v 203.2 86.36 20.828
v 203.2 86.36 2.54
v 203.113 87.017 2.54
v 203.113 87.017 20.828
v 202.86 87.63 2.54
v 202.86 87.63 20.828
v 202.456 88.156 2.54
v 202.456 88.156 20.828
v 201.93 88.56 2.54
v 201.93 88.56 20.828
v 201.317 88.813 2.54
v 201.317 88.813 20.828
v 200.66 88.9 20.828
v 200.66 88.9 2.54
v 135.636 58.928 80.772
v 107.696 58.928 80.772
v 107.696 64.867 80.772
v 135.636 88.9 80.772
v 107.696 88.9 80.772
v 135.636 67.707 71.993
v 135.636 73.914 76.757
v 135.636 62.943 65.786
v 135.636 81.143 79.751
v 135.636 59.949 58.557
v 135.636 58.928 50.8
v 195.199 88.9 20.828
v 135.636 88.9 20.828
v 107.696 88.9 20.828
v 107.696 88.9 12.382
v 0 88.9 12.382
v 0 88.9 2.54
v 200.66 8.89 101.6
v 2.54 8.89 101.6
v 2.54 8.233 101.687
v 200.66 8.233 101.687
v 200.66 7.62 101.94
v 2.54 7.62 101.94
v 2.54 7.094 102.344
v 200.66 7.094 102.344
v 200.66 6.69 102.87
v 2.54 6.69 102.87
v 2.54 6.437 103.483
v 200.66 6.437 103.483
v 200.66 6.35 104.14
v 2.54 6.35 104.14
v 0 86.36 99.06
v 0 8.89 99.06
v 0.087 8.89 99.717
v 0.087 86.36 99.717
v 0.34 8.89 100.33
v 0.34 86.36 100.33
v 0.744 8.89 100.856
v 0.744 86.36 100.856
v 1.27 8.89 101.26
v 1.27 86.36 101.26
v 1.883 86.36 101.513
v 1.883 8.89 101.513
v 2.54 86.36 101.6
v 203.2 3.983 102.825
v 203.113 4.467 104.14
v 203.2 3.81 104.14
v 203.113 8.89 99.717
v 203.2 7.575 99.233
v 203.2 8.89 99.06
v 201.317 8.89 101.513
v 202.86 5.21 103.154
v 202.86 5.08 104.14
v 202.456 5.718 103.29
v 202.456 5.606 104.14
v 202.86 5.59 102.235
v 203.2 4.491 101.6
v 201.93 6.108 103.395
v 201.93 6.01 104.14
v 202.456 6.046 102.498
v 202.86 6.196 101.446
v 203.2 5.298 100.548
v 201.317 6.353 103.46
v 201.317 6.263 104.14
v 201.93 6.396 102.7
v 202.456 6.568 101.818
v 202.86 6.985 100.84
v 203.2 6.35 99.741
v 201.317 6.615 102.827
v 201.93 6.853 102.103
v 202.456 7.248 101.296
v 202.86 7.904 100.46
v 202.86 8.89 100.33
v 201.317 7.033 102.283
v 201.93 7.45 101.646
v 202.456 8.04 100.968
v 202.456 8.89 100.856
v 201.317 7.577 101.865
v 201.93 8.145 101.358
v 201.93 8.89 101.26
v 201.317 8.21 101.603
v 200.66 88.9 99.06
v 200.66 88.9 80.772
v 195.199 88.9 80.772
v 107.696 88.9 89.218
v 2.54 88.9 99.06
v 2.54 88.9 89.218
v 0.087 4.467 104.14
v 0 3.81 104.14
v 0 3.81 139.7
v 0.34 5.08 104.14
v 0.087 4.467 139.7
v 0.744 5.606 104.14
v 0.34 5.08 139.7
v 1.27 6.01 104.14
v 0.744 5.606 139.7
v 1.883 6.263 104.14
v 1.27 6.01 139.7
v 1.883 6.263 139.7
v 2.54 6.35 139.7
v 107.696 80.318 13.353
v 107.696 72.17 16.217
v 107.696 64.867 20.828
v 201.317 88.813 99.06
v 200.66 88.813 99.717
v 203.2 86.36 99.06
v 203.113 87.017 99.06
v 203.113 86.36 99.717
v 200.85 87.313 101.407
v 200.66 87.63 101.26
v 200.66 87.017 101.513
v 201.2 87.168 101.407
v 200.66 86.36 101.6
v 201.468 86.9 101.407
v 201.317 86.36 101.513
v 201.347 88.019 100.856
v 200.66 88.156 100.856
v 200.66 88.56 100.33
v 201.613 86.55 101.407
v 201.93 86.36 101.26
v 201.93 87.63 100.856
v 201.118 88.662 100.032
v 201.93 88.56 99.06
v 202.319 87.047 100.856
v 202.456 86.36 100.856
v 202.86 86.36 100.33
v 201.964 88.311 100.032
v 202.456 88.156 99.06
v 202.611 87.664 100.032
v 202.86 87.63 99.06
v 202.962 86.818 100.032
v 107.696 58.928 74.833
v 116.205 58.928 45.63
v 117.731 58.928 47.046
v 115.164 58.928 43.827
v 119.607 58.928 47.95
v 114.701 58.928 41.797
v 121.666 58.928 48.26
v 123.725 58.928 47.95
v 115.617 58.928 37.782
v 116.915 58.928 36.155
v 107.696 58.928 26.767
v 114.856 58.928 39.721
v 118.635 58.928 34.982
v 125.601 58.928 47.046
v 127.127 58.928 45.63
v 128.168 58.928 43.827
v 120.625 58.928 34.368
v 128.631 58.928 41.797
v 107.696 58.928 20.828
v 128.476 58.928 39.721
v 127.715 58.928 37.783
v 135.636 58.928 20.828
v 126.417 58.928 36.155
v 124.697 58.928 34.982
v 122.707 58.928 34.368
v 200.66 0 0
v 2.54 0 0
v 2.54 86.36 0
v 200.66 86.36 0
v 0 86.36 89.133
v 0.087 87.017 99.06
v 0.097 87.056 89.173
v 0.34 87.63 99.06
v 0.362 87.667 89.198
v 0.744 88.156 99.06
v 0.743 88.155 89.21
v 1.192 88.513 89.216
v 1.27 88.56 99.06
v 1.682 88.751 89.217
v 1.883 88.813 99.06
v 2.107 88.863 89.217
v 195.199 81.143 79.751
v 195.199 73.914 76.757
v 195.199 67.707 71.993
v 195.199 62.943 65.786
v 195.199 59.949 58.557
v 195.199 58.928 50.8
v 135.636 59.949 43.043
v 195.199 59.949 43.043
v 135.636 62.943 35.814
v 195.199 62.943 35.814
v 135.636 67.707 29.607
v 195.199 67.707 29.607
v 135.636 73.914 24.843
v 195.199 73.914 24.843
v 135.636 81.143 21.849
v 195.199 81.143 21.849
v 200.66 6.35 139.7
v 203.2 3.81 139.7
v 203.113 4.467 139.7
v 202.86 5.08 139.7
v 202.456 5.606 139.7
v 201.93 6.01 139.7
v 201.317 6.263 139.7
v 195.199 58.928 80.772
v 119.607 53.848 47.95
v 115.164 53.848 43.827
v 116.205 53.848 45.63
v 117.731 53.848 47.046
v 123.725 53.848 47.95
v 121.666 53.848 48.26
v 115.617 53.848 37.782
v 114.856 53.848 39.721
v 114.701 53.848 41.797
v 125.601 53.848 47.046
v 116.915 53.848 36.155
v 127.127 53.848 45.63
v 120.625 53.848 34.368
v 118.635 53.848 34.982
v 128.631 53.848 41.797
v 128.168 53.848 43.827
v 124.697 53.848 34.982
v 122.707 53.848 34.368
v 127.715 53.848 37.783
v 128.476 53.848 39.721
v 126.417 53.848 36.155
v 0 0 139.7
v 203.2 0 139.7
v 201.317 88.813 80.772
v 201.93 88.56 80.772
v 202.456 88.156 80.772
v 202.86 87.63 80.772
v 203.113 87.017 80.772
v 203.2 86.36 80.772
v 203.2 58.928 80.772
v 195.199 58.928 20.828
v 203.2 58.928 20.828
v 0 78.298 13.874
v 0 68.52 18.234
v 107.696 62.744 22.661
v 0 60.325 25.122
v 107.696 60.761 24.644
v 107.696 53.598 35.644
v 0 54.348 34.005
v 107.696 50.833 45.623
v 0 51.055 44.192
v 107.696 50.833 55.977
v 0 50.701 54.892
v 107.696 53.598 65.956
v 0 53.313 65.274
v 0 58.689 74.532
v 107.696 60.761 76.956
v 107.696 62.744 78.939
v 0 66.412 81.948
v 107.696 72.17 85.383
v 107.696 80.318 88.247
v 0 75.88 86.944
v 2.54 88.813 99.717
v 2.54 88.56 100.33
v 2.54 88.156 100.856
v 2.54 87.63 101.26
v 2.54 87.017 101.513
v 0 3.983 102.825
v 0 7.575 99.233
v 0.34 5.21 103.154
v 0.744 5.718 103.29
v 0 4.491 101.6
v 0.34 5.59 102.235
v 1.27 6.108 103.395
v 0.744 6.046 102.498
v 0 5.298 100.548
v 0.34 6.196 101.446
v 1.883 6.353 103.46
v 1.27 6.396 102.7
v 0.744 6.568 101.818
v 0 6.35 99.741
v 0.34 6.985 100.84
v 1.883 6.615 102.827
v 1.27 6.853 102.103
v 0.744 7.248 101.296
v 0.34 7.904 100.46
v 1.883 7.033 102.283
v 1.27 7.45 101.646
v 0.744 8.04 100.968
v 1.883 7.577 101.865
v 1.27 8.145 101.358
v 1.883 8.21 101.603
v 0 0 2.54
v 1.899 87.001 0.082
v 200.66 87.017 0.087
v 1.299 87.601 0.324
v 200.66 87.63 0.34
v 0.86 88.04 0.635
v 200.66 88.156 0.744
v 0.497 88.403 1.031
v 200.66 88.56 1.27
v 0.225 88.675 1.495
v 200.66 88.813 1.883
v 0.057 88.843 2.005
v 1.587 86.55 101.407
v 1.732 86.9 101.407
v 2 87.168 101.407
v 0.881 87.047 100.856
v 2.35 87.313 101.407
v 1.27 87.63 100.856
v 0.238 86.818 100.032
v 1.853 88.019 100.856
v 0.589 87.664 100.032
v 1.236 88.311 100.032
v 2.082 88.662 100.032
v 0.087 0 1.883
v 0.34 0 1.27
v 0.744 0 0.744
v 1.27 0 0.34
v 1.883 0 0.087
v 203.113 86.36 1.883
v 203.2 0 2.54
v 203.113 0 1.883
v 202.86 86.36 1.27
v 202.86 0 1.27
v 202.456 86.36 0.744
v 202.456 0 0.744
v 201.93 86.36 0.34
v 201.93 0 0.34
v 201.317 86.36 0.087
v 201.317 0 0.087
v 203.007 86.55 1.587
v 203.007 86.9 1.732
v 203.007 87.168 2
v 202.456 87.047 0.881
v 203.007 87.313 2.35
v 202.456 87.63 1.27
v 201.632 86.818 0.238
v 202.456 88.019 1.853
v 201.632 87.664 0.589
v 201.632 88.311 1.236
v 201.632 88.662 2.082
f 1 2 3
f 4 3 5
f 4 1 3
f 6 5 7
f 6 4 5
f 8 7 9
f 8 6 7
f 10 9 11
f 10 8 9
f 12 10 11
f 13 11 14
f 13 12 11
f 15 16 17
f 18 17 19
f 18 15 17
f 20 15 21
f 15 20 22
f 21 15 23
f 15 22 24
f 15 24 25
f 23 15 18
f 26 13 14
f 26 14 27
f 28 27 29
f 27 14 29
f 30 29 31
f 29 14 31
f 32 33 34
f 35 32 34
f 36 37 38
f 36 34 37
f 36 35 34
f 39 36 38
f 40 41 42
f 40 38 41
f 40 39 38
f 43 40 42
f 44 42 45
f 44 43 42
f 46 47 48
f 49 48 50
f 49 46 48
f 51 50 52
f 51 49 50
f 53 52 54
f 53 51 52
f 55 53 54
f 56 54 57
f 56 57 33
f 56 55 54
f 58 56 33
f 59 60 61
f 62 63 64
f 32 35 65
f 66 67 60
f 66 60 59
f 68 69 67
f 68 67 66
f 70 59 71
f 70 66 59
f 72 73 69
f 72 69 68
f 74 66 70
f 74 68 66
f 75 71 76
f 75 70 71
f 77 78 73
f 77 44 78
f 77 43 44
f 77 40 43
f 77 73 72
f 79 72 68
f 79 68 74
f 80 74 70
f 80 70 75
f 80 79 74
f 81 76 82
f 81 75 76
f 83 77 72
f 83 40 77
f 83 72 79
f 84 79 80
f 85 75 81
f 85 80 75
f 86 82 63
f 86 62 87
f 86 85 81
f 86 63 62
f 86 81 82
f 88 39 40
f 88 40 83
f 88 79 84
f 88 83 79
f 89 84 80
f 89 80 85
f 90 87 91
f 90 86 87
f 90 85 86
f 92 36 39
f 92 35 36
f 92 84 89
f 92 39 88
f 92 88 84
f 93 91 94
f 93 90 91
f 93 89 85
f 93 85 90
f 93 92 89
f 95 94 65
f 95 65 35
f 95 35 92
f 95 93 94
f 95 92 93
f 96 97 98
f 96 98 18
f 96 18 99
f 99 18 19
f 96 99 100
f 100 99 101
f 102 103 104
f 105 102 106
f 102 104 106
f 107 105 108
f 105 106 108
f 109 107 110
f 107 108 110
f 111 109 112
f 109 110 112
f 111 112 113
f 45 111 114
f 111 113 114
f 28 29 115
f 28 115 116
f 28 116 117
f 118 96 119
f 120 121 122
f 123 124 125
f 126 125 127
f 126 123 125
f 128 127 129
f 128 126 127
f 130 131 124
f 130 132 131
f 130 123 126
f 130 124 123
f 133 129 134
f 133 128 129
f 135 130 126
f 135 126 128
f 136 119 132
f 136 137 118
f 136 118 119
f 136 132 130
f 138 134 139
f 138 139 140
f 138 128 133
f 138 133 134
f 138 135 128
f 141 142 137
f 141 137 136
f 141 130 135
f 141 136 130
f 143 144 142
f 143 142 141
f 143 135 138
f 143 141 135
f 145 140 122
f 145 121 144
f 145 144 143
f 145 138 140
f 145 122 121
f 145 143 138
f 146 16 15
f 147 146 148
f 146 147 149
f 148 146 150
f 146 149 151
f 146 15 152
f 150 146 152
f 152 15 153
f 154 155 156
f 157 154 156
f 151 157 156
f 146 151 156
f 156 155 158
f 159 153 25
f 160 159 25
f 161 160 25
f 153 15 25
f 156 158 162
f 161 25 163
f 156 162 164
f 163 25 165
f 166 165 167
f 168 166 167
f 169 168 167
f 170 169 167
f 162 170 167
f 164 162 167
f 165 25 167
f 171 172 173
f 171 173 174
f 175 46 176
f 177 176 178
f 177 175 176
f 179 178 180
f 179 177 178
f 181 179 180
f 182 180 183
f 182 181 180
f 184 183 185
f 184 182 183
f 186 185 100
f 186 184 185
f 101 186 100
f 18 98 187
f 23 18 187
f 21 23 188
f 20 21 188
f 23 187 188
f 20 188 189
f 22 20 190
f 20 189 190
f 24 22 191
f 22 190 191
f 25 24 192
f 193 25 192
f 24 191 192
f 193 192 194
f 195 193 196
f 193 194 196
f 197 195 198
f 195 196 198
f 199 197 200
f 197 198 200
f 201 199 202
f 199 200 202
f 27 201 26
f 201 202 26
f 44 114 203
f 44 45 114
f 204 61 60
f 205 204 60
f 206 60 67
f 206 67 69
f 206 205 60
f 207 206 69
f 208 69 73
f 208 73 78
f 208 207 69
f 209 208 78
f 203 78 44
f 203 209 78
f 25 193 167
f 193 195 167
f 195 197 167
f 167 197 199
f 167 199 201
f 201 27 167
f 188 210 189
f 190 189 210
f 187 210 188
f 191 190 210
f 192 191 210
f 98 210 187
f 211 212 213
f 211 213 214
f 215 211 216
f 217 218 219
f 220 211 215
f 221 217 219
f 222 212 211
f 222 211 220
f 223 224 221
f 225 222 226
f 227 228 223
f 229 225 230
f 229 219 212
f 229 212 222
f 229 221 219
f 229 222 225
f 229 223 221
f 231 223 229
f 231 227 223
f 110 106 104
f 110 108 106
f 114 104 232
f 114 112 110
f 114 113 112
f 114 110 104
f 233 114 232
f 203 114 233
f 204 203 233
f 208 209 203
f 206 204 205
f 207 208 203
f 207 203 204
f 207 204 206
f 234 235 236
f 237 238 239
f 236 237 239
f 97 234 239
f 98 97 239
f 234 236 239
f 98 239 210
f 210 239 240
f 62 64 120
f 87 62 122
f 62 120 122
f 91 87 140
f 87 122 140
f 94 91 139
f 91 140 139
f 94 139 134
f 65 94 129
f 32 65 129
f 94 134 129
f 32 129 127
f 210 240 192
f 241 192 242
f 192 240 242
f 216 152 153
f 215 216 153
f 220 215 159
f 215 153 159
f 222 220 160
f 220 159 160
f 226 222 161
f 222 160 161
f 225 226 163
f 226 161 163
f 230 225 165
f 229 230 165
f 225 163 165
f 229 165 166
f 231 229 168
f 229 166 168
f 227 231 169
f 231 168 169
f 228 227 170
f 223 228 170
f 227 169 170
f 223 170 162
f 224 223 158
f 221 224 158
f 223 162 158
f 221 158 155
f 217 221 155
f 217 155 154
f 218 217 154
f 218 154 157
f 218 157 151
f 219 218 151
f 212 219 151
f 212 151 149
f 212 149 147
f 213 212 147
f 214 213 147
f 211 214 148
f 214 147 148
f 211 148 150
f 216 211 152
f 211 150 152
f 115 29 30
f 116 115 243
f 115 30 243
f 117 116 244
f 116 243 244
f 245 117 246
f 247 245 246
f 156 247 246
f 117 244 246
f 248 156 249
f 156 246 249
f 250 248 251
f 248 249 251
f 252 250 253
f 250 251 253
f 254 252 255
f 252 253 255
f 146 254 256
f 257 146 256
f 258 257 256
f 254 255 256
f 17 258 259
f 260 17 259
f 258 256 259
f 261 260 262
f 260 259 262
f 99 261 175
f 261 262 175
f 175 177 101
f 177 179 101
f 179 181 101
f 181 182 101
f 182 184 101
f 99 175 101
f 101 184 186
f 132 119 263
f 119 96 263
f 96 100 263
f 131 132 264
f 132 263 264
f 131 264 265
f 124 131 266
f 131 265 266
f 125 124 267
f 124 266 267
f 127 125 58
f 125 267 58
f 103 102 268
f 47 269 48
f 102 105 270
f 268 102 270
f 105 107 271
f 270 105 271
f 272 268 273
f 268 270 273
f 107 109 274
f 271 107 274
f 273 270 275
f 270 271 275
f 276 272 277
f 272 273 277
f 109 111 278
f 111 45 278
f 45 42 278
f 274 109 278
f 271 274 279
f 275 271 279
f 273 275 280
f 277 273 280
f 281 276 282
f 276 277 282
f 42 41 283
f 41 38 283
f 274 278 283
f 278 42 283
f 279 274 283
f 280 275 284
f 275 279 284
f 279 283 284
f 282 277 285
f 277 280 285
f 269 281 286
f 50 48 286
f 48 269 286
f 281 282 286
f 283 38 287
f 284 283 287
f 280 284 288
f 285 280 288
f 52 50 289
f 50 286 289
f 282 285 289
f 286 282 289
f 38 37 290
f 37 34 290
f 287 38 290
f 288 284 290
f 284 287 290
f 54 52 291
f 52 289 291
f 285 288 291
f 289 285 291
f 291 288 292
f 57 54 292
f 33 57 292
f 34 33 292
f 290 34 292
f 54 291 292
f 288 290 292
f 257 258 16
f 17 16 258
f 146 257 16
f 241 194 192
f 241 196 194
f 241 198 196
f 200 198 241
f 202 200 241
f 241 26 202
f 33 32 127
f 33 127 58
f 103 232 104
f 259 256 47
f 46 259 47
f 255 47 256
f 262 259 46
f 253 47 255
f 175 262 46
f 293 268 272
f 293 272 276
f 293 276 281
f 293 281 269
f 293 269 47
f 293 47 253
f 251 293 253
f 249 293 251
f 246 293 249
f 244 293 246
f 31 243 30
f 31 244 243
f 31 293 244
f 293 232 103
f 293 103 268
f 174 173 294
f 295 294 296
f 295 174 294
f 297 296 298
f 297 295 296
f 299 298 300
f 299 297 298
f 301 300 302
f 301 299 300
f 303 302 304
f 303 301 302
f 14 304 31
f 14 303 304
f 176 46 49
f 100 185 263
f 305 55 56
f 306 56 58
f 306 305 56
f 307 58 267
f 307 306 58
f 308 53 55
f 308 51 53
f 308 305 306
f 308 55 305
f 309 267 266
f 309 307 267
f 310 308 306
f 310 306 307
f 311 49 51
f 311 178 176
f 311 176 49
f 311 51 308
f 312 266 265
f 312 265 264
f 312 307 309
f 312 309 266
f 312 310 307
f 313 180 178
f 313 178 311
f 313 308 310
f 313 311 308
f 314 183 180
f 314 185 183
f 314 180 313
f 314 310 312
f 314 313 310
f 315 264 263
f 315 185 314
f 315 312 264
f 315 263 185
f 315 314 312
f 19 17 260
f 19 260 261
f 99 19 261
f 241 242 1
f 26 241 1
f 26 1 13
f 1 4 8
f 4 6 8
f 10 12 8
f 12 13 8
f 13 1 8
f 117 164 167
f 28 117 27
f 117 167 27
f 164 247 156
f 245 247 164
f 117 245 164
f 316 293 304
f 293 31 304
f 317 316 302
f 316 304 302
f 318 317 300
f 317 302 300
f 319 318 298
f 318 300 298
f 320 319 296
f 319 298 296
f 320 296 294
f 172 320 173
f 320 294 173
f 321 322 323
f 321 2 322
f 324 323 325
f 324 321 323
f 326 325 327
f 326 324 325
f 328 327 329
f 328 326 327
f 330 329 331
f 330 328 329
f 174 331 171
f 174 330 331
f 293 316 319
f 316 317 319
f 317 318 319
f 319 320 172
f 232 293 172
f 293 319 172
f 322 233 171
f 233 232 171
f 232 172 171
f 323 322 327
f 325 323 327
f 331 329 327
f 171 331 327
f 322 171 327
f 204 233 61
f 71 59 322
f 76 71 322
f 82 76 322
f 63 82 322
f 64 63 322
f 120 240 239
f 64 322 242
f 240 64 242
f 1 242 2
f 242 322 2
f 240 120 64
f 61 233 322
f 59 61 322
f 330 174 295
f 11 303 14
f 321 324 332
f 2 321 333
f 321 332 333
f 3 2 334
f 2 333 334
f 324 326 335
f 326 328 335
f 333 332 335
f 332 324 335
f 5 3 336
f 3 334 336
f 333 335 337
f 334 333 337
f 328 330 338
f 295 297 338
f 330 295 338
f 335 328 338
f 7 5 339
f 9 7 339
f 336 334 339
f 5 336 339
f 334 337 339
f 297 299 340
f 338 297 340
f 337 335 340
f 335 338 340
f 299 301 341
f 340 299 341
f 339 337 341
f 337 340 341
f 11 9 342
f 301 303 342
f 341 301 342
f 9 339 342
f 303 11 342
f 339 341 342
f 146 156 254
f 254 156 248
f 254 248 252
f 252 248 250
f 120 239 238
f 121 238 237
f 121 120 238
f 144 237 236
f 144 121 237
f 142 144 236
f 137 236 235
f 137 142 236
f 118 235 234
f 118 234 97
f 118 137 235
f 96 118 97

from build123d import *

# Parameters (mm, degrees)
BOSS_EXTRUDE1_DEPTH = 88.89999999999999
SKETCH2_R           = 29.97200000000001
CUT_EXTRUDE1_DEPTH  = 203.2
CUT_EXTRUDE2_DEPTH  = 8.001
SKETCH4_W           = 59.943999999999946
SKETCH4_H           = 29.972
CUT_EXTRUDE3_DEPTH  = 27.94
SKETCH5_R           = 38.417500000000004
CUT_EXTRUDE4_DEPTH  = 107.696
CUT_EXTRUDE5_DEPTH  = 5.08
SKETCH7_W           = 203.19999999999996
SKETCH7_H           = 6.349999999999999
BOSS_EXTRUDE2_DEPTH = 38.1
FILLET1_R           = 2.54


with BuildPart() as part:
    # Sketch1 → Boss-Extrude1 (new body)
    with BuildSketch(Plane(origin=(0, 0, 0), x_dir=(1, 0, 0), z_dir=(0, 1, 0))):
        Polygon((0, 0), (203.2, 0), (203.2, -101.6), (1.244e-14, -101.6), align=None)
    extrude(amount=BOSS_EXTRUDE1_DEPTH)

    # Sketch2 → Cut-Extrude1 (cut)
    with BuildSketch(Plane(origin=(203.2, 0, 0), x_dir=(-2.2e-16, 0, -1), z_dir=(1, 0, -2.2e-16))):
        with Locations((-50.8, 88.89999999999999)):
            Circle(SKETCH2_R)
    extrude(amount=-CUT_EXTRUDE1_DEPTH, mode=Mode.SUBTRACT)

    # Sketch3 → Cut-Extrude2 (cut)
    with BuildSketch(Plane(origin=(203.2, 0, 0), x_dir=(-2.2e-16, 0, -1), z_dir=(1, 0, -2.2e-16))):
        Polygon((-20.82800000000002, 118.87199999999997), (-80.77199999999996, 118.87199999999996), (-80.77199999999996, 58.928000000000004), (-20.828000000000007, 58.928000000000004), align=None)
    extrude(amount=-CUT_EXTRUDE2_DEPTH, mode=Mode.SUBTRACT)

    # Sketch4 → Cut-Extrude3 (cut)
    with BuildSketch(Plane(origin=(135.636, 0, 0), x_dir=(-2.2e-16, 0, -1), z_dir=(1, 0, -2.2e-16))):
        with Locations((-50.800000000000004, 73.914)):
            Rectangle(SKETCH4_W, SKETCH4_H)
    extrude(amount=-CUT_EXTRUDE3_DEPTH, mode=Mode.SUBTRACT)

    # Sketch5 → Cut-Extrude4 (cut)
    with BuildSketch(Plane.ZY):
        with Locations((50.8, 88.89999999999999)):
            Circle(SKETCH5_R)
    extrude(amount=-CUT_EXTRUDE4_DEPTH, mode=Mode.SUBTRACT)

    # Sketch6 → Cut-Extrude5 (cut)
    with BuildSketch(Plane(origin=(0, 58.928000000000004, 0), x_dir=(1, 0, 0), z_dir=(0, 1, 0))):
        with BuildLine():
            ThreePointArc((121.66599999999983, -34.29000000000002), (114.68100000000004, -41.275000000000006), (121.66599999999983, -48.25999999999999))
            Line((121.66600000000003, -48.25999999999999), (121.66600000000003, -34.29000000000002))
        make_face()
        with BuildLine():
            Line((121.66600000000003, -34.29000000000002), (121.66600000000003, -48.25999999999999))
            ThreePointArc((121.66599999999983, -48.25999999999999), (126.60514086658797, -46.214140866588096), (128.651, -41.275000000000006))
            ThreePointArc((128.651, -41.275000000000006), (126.60514086658797, -36.335859133411915), (121.66599999999983, -34.29000000000002))
        make_face()
    extrude(amount=-CUT_EXTRUDE5_DEPTH, mode=Mode.SUBTRACT)

    # Sketch7 → Boss-Extrude2 (add)
    with BuildSketch(Plane.XY.offset(101.6)):
        with Locations((101.59999999999998, 3.1749999999999994)):
            Rectangle(SKETCH7_W, SKETCH7_H)
    extrude(amount=BOSS_EXTRUDE2_DEPTH)

    # Fillet1
    fillet1_edges = [part.edges().sort_by_distance(p)[0] for p in [
        (101.6, 6.35, 101.6),
        (0, 6.35, 120.64999999999999),
        (203.2, 6.35, 120.64999999999999),
        (0, 44.449999999999996, 0),
        (1.168e-14, 88.89999999999999, 95.40875),
        (1.244e-14, 47.625, 101.6),
        (101.6, 88.89999999999999, 0),
        (203.2, 44.449999999999996, 0),
        (203.2, 88.89999999999999, 10.413999999999994),
        (203.2, 88.89999999999999, 91.186),
        (101.6, 88.89999999999999, 101.6),
        (203.2, 47.625, 101.6),
    ]]
    fillet(fillet1_edges, radius=FILLET1_R)


solid = part.part
